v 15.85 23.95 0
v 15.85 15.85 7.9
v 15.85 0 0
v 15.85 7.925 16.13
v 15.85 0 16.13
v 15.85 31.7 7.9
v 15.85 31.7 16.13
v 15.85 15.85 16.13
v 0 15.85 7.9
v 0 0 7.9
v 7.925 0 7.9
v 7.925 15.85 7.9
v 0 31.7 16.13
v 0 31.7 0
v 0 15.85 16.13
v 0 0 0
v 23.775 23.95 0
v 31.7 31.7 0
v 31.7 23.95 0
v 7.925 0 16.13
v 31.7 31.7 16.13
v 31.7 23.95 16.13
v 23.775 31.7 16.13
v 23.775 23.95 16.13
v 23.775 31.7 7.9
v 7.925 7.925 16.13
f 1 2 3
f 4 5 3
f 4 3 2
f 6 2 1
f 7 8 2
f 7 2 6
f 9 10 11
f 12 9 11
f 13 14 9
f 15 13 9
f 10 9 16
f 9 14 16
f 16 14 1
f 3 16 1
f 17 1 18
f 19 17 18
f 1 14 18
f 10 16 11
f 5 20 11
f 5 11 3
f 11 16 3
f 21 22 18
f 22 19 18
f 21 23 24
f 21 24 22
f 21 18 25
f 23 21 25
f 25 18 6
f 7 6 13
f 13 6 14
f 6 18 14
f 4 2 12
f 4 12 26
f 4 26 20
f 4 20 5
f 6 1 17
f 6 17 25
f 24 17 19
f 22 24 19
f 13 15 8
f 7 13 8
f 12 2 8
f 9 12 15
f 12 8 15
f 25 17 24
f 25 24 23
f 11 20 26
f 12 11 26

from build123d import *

# Parameters (mm, degrees)
F0_W      = 31.7
F0_H      = 31.7
F1_DEPTH  = 7.9
F3_DEPTH  = 7.901
F4_W      = 7.925
F4_H      = 7.75
F2_W      = 7.925
F2_H      = 7.75
F5_DEPTH  = 8.23
F6_DEPTH  = 8.23
F7_W      = 7.925
F7_H      = 7.75
F8_DEPTH  = 8.23
F10_DEPTH = 7.925
F12_DEPTH = 7.925


with BuildPart() as f1:
    # F0 (on Top) → F1 (new body)
    with BuildSketch(Plane.XY):
        with Locations((15.85, 15.85)):
            Rectangle(F0_W, F0_H)
    extrude(amount=F1_DEPTH)

    # F2 (on face) → F3 (cut, through all)
    with BuildSketch(Plane.XY.offset(7.9)):
        Polygon((15.85, 0), (31.7, 0), (31.7, 23.95), (23.775, 23.95), (15.85, 23.95), align=None)
    extrude(amount=-F3_DEPTH, mode=Mode.SUBTRACT)

    # F4 (on face) + F2 (on face) → F5 (join)
    with BuildSketch(Plane.XY.offset(7.9)):
        with Locations((27.7375, 27.825)):
            Rectangle(F4_W, F4_H)
    with BuildSketch(Plane.XY.offset(7.9)):
        with Locations((27.7375, 27.825)):
            Rectangle(F2_W, F2_H)
    extrude(amount=F5_DEPTH)

    # F2 (on face) → F6 (join)
    with BuildSketch(Plane.XY.offset(7.9)):
        Polygon((0, 0), (15.85, 0), (15.85, 23.95), (23.775, 23.95), (23.775, 31.7), (0, 31.7), align=None)
    extrude(amount=F6_DEPTH)

    # F7 (on face) → F8 (cut)
    with BuildSketch(Plane.XY.offset(16.13)):
        with Locations((19.8125, 27.825)):
            Rectangle(F7_W, F7_H)
        Polygon((0, 0), (7.925, 0), (7.925, 7.925), (15.85, 7.925), (15.85, 15.85), (0, 15.85), align=None)
    extrude(amount=-F8_DEPTH, mode=Mode.SUBTRACT)

    # F9 (on face) → F10 (join, through all)
    with BuildSketch(Plane.YZ.offset(15.85)):
        Polygon((15.85, 7.9), (7.925, 16.13), (7.925, 7.9), align=None)
    extrude(amount=-F10_DEPTH)

    # F11 (on face) → F12 (cut, through all)
    with BuildSketch(Plane.YZ.offset(15.85)):
        Polygon((23.95, 0), (31.7, 7.9), (23.95, 7.9), align=None)
    extrude(amount=F12_DEPTH, mode=Mode.SUBTRACT)


solid = f1.part
